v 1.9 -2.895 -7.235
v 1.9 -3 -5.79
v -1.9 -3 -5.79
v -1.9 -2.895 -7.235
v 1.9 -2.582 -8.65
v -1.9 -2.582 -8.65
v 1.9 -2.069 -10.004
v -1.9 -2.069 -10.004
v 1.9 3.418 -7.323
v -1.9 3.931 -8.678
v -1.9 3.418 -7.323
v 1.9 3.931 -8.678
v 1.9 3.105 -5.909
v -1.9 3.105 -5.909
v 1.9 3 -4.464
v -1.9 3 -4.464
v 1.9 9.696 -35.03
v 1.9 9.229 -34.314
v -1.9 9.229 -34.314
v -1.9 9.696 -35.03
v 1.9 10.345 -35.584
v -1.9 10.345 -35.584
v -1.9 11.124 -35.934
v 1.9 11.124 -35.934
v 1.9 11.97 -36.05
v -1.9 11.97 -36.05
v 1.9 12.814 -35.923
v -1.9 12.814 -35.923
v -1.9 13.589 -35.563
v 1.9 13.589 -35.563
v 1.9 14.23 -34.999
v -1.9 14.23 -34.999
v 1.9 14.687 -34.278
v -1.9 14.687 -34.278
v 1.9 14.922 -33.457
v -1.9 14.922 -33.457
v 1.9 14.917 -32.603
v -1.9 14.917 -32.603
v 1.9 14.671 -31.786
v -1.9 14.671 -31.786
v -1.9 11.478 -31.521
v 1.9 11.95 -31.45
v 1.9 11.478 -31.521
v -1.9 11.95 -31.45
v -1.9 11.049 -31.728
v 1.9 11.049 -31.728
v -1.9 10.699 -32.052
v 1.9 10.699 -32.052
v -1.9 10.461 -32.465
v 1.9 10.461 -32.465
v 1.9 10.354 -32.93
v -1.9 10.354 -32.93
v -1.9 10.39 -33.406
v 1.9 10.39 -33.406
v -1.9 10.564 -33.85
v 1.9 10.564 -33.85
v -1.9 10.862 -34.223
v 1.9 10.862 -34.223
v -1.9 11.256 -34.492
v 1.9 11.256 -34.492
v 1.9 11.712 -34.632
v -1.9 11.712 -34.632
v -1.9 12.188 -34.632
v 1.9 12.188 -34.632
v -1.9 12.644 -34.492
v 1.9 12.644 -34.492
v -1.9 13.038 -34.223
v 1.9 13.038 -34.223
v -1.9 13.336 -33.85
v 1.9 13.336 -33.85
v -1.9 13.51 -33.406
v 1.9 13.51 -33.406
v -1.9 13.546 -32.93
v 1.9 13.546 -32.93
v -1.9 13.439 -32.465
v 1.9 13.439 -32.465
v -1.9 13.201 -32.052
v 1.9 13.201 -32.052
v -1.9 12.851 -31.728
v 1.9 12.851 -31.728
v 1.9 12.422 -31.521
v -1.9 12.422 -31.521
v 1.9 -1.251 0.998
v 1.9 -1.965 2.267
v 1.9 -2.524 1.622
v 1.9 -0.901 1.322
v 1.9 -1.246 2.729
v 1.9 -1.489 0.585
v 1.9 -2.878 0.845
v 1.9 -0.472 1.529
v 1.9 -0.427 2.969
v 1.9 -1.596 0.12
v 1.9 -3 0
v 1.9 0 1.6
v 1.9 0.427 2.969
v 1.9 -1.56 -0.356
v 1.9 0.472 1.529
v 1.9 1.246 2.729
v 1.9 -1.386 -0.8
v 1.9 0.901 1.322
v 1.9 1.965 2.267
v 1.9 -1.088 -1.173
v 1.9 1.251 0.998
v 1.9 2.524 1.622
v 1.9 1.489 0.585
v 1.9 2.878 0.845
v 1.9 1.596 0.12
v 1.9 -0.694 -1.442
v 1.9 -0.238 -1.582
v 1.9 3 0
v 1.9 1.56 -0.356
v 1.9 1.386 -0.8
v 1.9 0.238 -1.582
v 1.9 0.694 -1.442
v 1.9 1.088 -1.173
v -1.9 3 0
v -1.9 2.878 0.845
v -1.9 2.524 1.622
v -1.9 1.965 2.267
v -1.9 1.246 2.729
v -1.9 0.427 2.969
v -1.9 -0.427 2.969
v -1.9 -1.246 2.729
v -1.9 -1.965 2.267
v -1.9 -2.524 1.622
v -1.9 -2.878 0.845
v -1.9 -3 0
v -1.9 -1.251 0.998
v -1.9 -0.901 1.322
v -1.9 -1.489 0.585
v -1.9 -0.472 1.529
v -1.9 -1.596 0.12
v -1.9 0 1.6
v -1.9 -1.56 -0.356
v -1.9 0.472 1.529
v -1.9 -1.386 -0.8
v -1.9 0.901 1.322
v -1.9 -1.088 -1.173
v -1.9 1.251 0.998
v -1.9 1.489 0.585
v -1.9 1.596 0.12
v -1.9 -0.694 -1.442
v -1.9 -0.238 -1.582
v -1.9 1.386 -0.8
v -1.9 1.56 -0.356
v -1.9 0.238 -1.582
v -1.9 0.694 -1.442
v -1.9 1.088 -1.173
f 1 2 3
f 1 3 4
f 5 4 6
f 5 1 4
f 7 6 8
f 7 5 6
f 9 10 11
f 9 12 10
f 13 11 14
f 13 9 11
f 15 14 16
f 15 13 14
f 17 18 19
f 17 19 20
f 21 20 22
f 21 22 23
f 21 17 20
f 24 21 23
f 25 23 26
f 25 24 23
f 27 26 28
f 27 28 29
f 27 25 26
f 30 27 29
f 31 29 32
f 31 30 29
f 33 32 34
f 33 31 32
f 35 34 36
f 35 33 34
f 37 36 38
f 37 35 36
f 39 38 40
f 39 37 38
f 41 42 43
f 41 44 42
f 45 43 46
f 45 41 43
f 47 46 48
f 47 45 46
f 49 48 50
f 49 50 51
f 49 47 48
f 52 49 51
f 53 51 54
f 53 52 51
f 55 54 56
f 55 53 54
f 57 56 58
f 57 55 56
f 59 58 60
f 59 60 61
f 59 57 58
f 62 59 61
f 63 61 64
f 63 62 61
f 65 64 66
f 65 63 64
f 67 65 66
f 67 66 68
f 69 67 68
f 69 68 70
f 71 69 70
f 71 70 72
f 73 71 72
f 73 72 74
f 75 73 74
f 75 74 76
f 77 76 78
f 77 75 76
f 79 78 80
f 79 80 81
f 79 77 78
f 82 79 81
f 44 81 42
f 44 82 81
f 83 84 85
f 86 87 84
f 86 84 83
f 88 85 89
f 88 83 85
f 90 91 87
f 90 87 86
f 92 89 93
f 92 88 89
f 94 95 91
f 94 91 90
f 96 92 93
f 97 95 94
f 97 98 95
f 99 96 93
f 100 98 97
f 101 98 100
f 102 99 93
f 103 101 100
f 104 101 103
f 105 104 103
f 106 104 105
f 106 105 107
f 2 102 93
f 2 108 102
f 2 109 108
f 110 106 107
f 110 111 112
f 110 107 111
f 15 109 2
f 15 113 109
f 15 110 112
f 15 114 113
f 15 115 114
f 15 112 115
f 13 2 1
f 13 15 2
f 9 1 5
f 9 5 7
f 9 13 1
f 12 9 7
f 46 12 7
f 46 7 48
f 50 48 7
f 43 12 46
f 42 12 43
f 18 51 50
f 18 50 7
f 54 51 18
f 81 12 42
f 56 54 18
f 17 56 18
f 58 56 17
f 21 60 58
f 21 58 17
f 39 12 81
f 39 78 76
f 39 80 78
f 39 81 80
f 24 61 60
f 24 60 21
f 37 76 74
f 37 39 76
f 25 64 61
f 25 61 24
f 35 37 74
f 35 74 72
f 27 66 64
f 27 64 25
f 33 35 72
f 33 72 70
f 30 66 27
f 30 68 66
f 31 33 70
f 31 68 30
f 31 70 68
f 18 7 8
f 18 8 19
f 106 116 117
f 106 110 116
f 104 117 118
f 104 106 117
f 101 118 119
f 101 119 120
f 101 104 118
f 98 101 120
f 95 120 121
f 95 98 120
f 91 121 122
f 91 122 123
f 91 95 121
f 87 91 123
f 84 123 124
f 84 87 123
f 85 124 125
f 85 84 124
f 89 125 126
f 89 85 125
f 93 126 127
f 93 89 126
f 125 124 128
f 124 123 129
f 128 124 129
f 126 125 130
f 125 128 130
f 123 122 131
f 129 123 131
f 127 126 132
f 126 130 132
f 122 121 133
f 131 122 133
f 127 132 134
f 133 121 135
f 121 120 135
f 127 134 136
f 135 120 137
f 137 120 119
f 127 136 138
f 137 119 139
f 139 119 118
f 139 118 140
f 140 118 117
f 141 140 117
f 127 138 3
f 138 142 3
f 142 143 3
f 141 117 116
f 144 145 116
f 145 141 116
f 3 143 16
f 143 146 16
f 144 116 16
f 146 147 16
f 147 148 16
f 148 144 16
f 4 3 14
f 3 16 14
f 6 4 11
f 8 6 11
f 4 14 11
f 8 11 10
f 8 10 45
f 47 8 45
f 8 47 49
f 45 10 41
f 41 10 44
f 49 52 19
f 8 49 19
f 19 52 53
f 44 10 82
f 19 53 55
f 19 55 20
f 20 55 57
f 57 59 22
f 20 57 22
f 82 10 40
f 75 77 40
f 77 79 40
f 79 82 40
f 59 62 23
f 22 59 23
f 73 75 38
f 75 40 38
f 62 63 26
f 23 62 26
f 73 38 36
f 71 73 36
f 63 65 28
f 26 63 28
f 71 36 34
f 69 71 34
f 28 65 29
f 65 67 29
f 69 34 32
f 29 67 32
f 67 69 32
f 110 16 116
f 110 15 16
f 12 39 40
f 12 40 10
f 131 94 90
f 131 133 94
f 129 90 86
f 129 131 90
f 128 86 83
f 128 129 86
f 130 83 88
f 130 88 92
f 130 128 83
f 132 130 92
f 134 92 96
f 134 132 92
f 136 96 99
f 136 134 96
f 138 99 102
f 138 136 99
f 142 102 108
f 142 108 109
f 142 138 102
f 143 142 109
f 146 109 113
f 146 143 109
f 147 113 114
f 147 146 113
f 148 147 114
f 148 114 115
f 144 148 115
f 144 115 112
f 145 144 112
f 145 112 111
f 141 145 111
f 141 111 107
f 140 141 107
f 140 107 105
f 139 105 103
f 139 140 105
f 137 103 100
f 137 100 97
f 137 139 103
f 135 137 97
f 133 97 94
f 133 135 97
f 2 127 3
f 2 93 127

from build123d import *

# Parameters (mm, degrees)
SKETCH1_R           = 1.6
BOSS_EXTRUDE1_DEPTH = 1.9


with BuildPart() as part:
    # Sketch1 → Boss-Extrude1 (new, symmetric)
    with BuildSketch(Plane(origin=(0, 0, 0), x_dir=(0, 0, -1), z_dir=(1, 0, 0))):
        with BuildLine():
            Line((0, -3), (5.789792528, -3))
            ThreePointArc((5.789792528, -3), (7.947916139, -2.764348543), (10.004326756, -2.068500496))
            Line((10.004326756, -2.068500496), (34.314360268, 9.229449851))
            ThreePointArc((34.314360268, 9.229449851), (35.770550149, 13.214360268), (31.785639732, 14.670550149))
            Line((31.785639732, 14.670550149), (8.678202272, 3.931499504))
            ThreePointArc((8.678202272, 3.931499504), (6.621791656, 3.235651457), (4.463668044, 3))
            Line((4.463668044, 3), (0, 3))
            ThreePointArc((0, 3), (-3, 0), (0, -3))
        make_face()
        with Locations(Location((0, 0, 0), (0, 0, 180))):
            Circle(SKETCH1_R, mode=Mode.SUBTRACT)
        with Locations(Location((33.05, 11.95, 0), (0, 0, 180))):
            Circle(SKETCH1_R, mode=Mode.SUBTRACT)
    extrude(amount=BOSS_EXTRUDE1_DEPTH, both=True)


solid = part.part
